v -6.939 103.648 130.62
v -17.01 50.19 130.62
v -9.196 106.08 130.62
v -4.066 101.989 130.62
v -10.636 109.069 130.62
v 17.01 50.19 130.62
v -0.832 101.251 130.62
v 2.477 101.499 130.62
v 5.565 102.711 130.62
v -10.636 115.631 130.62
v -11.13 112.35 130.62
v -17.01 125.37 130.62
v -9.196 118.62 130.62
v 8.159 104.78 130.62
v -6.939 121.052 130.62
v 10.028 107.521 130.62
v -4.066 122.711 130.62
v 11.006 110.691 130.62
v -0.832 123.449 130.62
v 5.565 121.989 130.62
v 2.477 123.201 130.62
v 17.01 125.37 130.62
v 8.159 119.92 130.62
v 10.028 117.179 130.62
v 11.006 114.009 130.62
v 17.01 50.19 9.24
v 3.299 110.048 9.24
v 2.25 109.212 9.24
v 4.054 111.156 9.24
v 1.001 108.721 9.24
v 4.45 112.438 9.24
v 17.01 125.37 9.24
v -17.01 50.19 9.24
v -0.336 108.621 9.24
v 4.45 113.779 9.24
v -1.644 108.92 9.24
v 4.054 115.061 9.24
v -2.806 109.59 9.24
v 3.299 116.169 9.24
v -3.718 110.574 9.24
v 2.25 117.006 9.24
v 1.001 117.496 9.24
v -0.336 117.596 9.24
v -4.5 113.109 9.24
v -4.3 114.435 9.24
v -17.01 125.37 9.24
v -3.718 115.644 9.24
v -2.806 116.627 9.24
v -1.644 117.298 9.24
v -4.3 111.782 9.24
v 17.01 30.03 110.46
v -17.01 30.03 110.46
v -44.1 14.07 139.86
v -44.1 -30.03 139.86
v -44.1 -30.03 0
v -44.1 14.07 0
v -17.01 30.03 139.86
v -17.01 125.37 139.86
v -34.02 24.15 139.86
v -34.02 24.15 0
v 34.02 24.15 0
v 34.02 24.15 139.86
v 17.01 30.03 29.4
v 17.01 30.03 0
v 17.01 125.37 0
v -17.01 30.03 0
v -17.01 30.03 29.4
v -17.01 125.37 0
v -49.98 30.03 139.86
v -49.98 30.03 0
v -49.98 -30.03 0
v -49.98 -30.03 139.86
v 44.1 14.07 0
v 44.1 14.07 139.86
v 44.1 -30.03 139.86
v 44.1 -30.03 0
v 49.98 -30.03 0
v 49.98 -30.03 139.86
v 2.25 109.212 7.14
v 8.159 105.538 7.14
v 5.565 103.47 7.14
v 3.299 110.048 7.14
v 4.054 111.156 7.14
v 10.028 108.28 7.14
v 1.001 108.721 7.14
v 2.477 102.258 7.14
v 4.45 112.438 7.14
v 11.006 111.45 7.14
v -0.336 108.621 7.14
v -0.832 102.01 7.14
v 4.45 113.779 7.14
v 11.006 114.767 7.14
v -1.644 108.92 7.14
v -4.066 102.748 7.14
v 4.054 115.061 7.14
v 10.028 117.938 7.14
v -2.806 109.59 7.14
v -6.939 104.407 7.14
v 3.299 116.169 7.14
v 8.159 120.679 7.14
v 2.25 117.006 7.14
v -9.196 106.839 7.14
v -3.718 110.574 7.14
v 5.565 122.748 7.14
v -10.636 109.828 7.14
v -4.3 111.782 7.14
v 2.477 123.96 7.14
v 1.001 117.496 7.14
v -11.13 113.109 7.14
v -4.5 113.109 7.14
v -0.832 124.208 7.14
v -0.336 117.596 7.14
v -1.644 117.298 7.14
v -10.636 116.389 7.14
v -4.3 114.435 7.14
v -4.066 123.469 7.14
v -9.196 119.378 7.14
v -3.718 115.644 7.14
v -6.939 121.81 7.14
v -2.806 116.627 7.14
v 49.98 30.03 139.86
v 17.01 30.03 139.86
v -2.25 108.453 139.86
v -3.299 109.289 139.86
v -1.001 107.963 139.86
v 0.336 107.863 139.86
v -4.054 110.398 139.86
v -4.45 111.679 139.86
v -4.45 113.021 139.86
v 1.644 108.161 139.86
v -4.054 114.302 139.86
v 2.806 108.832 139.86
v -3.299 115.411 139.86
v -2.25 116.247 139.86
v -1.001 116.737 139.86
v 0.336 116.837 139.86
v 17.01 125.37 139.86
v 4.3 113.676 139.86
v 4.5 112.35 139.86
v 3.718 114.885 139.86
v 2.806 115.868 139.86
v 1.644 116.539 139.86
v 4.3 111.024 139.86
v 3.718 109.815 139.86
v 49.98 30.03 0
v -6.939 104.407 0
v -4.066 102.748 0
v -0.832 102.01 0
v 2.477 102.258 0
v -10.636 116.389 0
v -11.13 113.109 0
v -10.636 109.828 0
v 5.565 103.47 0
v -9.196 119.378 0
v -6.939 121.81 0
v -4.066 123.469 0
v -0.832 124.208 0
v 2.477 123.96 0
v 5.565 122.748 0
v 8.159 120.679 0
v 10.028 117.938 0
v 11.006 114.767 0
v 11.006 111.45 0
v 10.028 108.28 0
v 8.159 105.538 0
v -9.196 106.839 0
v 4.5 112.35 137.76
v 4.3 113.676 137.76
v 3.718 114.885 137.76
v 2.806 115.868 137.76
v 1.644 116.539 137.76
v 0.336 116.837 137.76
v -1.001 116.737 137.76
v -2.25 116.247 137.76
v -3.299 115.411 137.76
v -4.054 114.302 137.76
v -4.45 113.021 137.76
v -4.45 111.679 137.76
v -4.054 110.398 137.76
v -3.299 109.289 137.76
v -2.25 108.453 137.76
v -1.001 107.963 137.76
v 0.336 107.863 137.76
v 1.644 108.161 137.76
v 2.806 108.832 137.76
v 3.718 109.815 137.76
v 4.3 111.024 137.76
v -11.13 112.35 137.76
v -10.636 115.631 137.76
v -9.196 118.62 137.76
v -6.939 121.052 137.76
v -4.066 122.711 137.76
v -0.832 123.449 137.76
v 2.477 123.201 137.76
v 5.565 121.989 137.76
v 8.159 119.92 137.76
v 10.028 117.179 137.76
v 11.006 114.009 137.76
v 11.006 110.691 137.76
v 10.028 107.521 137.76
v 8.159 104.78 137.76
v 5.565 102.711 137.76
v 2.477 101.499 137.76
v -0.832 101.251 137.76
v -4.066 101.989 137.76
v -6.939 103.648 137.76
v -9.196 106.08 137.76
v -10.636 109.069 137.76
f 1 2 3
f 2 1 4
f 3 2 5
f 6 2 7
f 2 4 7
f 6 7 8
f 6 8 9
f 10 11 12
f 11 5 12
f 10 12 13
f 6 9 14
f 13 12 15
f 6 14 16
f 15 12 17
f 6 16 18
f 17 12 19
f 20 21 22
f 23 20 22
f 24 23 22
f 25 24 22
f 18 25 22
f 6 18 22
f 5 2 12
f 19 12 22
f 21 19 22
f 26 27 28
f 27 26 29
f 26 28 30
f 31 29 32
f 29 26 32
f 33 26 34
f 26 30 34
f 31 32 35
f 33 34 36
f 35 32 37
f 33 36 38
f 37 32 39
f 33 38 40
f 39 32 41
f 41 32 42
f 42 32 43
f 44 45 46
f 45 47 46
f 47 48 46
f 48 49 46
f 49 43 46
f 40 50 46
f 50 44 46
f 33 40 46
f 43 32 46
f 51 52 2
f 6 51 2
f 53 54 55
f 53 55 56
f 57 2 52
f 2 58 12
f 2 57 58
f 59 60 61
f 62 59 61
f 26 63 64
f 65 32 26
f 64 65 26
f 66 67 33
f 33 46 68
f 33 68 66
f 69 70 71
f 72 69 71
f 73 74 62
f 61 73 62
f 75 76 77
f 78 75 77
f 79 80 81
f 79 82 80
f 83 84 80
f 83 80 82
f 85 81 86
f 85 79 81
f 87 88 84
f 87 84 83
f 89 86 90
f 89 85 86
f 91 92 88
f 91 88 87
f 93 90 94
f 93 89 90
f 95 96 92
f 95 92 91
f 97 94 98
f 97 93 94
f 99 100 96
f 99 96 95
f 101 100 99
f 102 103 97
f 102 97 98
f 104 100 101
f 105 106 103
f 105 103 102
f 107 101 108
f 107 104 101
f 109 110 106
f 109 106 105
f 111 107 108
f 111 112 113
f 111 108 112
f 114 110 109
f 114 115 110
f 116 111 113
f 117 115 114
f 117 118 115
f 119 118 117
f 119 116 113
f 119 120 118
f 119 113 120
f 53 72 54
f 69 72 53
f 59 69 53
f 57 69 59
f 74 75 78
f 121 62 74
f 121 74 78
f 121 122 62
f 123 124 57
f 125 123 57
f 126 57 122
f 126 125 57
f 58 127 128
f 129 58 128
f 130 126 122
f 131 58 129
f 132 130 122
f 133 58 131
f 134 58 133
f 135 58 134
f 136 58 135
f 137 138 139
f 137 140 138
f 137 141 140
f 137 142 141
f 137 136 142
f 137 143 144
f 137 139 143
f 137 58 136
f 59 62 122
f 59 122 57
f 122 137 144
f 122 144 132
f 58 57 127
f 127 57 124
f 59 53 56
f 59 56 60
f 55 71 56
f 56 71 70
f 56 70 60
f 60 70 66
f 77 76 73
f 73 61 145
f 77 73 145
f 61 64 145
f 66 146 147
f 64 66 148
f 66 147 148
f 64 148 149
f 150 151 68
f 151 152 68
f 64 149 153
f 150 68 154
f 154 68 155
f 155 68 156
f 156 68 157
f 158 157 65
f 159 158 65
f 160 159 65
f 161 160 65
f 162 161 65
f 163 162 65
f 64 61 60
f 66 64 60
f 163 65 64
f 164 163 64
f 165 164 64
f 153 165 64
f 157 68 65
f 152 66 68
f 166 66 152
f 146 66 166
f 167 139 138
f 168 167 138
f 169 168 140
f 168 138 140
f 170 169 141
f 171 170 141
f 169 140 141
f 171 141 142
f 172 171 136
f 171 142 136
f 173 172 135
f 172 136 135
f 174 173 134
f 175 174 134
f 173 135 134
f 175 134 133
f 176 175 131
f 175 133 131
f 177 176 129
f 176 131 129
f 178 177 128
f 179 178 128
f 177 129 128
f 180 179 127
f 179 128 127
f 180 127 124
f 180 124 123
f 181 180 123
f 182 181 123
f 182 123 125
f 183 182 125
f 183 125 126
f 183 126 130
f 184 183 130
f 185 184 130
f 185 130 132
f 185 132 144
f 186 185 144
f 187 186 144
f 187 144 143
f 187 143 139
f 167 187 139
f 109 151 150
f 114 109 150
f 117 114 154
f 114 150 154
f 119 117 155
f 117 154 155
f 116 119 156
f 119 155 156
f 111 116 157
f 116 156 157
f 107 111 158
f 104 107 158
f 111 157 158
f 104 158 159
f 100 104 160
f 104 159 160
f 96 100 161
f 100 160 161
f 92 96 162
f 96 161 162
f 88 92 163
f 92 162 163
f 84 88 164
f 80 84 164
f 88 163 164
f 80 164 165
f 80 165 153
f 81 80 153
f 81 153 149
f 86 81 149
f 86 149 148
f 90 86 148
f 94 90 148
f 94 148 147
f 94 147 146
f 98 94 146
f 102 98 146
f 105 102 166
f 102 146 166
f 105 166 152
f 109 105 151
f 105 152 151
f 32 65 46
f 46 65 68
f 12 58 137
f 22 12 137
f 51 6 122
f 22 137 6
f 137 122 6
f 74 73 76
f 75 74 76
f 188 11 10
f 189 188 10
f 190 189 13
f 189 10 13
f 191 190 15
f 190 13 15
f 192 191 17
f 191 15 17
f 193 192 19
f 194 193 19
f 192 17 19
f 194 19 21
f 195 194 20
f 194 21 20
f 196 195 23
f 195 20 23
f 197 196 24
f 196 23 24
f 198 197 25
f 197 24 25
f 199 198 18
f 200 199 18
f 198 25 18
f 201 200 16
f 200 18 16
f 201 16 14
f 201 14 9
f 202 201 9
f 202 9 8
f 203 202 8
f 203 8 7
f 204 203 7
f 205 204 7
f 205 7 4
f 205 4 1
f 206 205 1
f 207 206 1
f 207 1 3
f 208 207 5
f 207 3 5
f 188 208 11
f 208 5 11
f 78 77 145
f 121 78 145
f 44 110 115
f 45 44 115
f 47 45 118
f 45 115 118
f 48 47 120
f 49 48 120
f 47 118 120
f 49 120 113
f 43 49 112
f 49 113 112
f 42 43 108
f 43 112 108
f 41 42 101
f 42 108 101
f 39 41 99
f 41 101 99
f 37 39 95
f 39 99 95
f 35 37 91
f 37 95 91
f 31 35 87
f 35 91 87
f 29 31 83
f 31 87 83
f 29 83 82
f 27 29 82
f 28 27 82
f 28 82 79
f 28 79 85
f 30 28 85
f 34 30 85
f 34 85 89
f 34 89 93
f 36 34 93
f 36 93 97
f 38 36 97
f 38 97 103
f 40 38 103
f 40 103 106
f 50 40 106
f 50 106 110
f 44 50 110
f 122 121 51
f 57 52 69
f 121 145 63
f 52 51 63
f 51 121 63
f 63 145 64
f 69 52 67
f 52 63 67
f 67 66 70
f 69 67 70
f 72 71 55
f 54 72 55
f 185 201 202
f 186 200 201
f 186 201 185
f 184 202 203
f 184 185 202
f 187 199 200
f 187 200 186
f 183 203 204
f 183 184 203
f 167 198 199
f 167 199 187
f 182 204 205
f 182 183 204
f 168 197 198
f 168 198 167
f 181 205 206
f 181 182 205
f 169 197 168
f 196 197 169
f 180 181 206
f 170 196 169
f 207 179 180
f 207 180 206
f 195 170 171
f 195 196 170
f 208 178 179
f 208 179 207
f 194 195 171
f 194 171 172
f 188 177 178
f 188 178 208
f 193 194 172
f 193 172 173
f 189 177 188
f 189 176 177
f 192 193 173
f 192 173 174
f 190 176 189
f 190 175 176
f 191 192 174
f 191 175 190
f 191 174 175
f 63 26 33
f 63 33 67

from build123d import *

# Parameters (mm, degrees)
RESSALTO_EXTRUS_O1_DEPTH = 139.86
RESSALTO_EXTRUS_O2_DEPTH = 139.86
ESBO_O3_W                = 34.02
ESBO_O3_H                = 95.34
RESSALTO_EXTRUS_O3_DEPTH = 9.24
ESBO_O4_R                = 4.5
CORTE_EXTRUS_O1_DEPTH    = 9.24
RESSALTO_EXTRUS_O4_DEPTH = 34.02
ESBO_O7_W                = 34.02
ESBO_O7_H                = 95.34
RESSALTO_EXTRUS_O5_DEPTH = 9.24
ESBO_O8_R                = 4.5
CORTE_EXTRUS_O3_DEPTH    = 9.24
ESBO_O9_R                = 11.13
CORTE_EXTRUS_O4_DEPTH    = 7.14
RESSALTO_EXTRUS_O6_DEPTH = 34.02
ESBO_O12_R               = 11.13
CORTE_EXTRUS_O5_DEPTH    = 7.14


with BuildPart() as part:
    # Esboço1 → Ressalto-extrusão1 (new body)
    with BuildSketch(Plane.XY):
        Polygon((44.1, -30.03), (49.98, -30.03), (49.98, 30.03), (-49.98, 30.03), (-49.98, -30.03), (-44.1, -30.03), (-44.1, 24.15), (44.1, 24.15), align=None)
    extrude(amount=RESSALTO_EXTRUS_O1_DEPTH)

    # Esboço2 → Ressalto-extrusão2 (add)
    with BuildSketch(Plane.XY.offset(139.86)):
        Polygon((-44.1, 24.15), (-44.1, 14.07), (-34.02, 24.15), align=None)
        Polygon((44.1, 24.15), (44.1, 14.07), (34.02, 24.15), align=None)
    extrude(amount=-RESSALTO_EXTRUS_O2_DEPTH)

    # Esboço3 → Ressalto-extrusão3 (add)
    with BuildSketch(Plane.XY.offset(139.86)):
        with Locations((0, 77.7)):
            Rectangle(ESBO_O3_W, ESBO_O3_H)
    extrude(amount=-RESSALTO_EXTRUS_O3_DEPTH)

    # Esboço4 → Corte-extrusão1 (cut)
    with BuildSketch(Plane.XY.offset(139.86)):
        with Locations((0, 112.35)):
            Circle(ESBO_O4_R)
    extrude(amount=-CORTE_EXTRUS_O1_DEPTH, mode=Mode.SUBTRACT)

    # Esboço6 → Ressalto-extrusão4 (add)
    with BuildSketch(Plane(origin=(17.01, 0, 0), x_dir=(0, 0, -1), z_dir=(1, 0, 0))):
        Polygon((-130.62, 50.19), (-130.62, 30.03), (-110.46, 30.03), align=None)
    extrude(amount=-RESSALTO_EXTRUS_O4_DEPTH)

    # Esboço7 → Ressalto-extrusão5 (add)
    with BuildSketch(Plane(origin=(0, 0, 0), x_dir=(-1, 0, 0), z_dir=(0, 0, -1))):
        with Locations((0, 77.7)):
            Rectangle(ESBO_O7_W, ESBO_O7_H)
    extrude(amount=-RESSALTO_EXTRUS_O5_DEPTH)

    # Esboço8 → Corte-extrusão3 (cut)
    with BuildSketch(Plane(origin=(0, 0, 0), x_dir=(-1, 0, 0), z_dir=(0, 0, -1))):
        with Locations((0, 113.108647766)):
            Circle(ESBO_O8_R)
    extrude(amount=-CORTE_EXTRUS_O3_DEPTH, mode=Mode.SUBTRACT)

    # Esboço9 → Corte-extrusão4 (cut)
    with BuildSketch(Plane(origin=(0, 0, 0), x_dir=(-1, 0, 0), z_dir=(0, 0, -1))):
        with Locations((0, 113.108647766)):
            Circle(ESBO_O9_R)
    extrude(amount=-CORTE_EXTRUS_O4_DEPTH, mode=Mode.SUBTRACT)

    # Esboço10 → Ressalto-extrusão6 (add)
    with BuildSketch(Plane(origin=(17.01, 0, 0), x_dir=(0, 0, -1), z_dir=(1, 0, 0))):
        Polygon((-9.24, 30.03), (-9.24, 50.19), (-29.4, 30.03), align=None)
    extrude(amount=-RESSALTO_EXTRUS_O6_DEPTH)

    # Esboço12 → Corte-extrusão5 (cut)
    with BuildSketch(Plane(origin=(0, 0, 130.62), x_dir=(-1, 0, 0), z_dir=(0, 0, -1))):
        with Locations((0, 112.35)):
            Circle(ESBO_O12_R)
    extrude(amount=-CORTE_EXTRUS_O5_DEPTH, mode=Mode.SUBTRACT)


solid = part.part
